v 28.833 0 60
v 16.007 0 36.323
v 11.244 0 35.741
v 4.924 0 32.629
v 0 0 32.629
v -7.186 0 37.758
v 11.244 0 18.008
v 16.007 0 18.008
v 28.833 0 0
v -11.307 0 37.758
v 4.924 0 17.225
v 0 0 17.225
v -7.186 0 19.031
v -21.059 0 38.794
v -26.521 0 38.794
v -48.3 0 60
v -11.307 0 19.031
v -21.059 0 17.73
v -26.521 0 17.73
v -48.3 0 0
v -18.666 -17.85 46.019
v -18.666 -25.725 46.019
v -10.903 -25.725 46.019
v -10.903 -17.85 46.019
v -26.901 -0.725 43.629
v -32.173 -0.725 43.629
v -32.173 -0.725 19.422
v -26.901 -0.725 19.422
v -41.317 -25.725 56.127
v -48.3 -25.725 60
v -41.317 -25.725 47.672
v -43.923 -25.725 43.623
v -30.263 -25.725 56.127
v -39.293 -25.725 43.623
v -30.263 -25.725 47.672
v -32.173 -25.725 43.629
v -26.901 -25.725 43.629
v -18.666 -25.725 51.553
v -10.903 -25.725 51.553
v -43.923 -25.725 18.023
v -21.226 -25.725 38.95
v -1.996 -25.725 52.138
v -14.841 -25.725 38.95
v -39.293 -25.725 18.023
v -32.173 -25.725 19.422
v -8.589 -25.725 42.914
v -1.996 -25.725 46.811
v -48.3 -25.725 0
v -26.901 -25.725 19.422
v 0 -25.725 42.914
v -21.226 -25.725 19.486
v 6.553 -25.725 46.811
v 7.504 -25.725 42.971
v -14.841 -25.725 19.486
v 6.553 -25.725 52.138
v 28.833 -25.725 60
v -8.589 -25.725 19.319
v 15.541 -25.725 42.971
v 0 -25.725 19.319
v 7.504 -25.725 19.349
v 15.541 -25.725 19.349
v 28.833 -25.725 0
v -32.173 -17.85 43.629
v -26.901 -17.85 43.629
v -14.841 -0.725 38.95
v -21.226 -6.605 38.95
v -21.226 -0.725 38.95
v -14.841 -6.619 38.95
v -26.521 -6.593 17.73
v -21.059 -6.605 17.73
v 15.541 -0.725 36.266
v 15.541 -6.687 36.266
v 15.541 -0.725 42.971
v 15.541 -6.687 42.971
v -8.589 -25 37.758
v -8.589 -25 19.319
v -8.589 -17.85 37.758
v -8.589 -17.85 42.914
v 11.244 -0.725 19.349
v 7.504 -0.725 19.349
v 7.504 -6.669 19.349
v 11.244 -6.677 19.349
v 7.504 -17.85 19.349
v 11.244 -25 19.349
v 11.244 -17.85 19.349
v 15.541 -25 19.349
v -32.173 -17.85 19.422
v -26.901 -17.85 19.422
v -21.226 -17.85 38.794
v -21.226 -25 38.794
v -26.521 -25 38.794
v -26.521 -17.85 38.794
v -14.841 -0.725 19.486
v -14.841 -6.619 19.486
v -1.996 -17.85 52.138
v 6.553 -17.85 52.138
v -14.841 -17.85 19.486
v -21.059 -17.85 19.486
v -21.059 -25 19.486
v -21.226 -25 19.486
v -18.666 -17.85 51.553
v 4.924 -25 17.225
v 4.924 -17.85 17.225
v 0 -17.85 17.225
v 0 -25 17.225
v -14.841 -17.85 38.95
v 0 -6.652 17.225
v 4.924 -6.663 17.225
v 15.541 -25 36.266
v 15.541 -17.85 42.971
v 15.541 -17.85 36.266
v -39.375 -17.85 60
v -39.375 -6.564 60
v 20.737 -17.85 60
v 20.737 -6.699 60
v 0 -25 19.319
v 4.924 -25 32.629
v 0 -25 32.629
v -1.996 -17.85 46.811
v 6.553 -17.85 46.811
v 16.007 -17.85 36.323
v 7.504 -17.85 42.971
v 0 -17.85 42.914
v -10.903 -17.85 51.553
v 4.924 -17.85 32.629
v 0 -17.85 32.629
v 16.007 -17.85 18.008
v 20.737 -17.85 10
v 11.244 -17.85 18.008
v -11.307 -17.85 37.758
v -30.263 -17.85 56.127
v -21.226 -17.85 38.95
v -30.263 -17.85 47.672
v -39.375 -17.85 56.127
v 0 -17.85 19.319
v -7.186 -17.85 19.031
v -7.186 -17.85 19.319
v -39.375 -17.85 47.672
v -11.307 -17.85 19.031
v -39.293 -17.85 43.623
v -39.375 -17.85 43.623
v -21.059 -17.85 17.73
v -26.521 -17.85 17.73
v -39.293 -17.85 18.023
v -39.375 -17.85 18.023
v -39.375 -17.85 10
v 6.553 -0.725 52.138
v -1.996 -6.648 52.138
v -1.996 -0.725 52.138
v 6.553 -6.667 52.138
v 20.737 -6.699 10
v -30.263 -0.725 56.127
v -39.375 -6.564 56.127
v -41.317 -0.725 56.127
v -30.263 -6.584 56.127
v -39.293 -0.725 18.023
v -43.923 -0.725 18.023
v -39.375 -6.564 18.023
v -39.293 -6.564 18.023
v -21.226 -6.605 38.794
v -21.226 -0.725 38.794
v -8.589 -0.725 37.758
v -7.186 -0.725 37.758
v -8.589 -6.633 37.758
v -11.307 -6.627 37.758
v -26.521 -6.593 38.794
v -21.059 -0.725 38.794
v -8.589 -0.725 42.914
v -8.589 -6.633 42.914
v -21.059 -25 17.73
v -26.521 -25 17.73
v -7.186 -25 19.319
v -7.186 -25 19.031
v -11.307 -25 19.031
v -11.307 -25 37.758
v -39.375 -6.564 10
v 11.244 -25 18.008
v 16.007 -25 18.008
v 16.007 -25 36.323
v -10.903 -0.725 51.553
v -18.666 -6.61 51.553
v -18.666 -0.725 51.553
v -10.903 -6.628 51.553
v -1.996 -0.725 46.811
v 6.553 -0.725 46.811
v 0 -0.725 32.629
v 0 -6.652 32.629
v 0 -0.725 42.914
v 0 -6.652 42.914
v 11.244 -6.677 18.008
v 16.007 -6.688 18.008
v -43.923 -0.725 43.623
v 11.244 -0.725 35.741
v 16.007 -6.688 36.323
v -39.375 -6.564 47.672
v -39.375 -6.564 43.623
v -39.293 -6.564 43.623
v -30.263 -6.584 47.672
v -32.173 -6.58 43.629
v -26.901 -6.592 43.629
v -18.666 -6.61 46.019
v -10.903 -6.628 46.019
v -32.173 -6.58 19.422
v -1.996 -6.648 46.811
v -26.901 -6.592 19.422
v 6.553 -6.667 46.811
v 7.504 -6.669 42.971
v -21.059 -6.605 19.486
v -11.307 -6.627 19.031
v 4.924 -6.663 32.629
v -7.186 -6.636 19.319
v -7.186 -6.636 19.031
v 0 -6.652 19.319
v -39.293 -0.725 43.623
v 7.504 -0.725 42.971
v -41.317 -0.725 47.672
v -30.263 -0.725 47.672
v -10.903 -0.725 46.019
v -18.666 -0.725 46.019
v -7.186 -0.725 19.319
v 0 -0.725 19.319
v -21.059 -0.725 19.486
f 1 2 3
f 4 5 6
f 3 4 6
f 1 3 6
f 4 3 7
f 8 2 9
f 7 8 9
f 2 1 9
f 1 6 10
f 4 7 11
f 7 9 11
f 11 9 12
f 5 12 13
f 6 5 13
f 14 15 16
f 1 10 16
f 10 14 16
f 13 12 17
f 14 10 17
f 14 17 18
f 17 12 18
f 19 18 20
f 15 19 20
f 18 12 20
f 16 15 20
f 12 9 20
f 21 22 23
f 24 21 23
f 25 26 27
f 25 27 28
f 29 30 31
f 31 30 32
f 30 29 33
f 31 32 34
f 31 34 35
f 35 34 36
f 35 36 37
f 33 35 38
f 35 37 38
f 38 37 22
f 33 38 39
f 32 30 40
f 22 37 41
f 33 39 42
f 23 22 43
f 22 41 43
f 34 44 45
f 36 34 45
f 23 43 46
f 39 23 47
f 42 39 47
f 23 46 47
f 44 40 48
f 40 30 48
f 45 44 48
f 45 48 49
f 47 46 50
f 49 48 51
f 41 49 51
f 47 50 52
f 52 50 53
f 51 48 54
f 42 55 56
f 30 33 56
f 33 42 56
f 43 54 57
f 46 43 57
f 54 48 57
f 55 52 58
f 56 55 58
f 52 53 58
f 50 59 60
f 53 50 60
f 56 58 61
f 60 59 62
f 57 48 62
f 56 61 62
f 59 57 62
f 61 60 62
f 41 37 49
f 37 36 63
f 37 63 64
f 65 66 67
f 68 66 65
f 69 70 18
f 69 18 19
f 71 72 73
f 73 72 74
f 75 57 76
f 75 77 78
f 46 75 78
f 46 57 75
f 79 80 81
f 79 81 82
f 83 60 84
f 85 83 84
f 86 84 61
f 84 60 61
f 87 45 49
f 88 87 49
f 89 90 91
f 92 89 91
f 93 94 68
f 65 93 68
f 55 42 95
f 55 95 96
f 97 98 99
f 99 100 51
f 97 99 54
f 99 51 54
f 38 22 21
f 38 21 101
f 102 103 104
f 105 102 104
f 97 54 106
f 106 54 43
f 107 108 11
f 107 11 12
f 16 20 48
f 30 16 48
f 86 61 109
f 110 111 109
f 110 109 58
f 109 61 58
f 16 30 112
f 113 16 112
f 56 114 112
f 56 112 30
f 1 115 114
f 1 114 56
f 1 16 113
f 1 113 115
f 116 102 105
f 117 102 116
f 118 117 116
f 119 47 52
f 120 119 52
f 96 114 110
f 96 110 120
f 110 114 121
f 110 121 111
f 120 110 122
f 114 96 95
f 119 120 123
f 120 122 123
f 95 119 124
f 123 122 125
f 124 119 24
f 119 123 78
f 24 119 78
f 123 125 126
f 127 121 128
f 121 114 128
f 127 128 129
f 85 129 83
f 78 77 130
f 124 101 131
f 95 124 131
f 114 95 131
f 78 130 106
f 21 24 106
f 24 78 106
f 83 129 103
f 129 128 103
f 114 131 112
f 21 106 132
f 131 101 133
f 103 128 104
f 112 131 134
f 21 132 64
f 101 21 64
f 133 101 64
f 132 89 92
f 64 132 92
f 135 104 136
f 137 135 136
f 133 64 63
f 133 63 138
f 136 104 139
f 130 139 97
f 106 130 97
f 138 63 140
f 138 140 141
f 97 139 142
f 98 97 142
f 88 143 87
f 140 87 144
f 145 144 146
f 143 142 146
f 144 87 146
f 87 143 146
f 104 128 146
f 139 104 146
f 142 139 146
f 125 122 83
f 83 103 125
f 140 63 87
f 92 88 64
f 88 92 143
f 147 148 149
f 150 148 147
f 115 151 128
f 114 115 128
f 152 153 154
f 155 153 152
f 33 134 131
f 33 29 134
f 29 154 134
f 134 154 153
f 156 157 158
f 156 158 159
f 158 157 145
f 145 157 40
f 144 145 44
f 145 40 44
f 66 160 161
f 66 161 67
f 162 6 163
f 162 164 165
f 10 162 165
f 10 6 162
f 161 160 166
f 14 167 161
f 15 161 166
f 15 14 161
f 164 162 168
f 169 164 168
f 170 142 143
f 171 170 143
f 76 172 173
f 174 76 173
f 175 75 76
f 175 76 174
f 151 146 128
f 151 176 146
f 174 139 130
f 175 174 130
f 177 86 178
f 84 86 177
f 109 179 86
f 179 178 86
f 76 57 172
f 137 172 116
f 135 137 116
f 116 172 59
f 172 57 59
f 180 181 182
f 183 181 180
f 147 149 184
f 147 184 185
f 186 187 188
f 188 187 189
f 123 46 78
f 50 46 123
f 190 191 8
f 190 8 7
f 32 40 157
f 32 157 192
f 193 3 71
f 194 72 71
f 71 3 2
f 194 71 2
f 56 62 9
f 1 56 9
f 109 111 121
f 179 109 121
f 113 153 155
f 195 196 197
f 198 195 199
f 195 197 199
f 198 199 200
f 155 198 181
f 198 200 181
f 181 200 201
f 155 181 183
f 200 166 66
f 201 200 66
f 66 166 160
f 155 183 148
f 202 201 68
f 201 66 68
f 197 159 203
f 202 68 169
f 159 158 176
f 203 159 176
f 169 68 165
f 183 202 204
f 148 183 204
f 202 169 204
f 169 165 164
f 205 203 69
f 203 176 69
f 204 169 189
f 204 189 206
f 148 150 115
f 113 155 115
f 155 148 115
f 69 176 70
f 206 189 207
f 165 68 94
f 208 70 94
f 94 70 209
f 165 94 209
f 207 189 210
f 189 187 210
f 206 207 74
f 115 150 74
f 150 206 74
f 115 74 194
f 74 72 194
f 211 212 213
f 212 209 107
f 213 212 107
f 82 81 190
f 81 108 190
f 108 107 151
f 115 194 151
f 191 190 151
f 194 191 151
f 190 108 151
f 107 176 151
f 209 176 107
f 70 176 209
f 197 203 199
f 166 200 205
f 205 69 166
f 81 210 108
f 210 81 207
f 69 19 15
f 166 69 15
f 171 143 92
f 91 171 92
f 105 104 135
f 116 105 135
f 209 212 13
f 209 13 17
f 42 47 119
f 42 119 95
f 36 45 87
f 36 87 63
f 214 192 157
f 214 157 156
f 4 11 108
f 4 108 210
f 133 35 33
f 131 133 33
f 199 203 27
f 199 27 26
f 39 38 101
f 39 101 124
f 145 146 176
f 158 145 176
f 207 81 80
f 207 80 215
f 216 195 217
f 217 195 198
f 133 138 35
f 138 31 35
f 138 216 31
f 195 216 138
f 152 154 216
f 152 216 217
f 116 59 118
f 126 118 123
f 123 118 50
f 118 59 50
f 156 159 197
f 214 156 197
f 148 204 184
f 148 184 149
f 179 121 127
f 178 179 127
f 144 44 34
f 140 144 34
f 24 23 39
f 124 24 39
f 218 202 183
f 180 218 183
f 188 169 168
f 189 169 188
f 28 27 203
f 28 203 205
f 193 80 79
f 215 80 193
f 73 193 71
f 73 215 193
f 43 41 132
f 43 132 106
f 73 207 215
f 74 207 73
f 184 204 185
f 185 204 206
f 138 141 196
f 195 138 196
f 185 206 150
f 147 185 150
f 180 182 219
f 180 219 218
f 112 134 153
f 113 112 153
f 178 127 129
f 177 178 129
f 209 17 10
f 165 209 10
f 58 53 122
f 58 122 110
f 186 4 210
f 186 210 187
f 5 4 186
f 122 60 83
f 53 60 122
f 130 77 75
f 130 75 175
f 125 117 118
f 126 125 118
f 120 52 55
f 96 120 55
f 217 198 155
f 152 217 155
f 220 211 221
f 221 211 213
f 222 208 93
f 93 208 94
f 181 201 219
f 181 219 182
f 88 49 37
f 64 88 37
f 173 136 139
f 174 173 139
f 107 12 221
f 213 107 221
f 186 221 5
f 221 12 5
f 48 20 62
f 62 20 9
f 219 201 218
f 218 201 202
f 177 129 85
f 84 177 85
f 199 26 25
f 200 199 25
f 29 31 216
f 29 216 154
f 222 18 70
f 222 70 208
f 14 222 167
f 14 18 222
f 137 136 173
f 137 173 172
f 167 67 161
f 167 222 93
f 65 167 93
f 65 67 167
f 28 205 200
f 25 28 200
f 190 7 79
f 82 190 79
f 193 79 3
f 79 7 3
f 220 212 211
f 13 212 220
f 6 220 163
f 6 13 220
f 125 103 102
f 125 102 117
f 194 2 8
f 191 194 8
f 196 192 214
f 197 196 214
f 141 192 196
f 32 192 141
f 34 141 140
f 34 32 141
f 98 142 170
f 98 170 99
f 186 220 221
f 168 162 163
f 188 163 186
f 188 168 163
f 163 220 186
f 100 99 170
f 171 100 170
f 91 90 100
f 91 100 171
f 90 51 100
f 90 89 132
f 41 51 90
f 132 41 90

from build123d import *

# Parameters (mm, degrees)
F1_DEPTH = 60
F3_DEPTH = 10
F5_DEPTH = 25
F6_W     = 4.12122
F6_H     = 18.726911
F6_W_2   = 5.461499
F6_H_2   = 21.064218
F6_W_3   = 4.923844
F6_H_3   = 15.403733
F7_DEPTH = 25
F8_W     = 5.271911
F8_H     = 24.206938
F8_W_2   = 6.385386
F8_H_2   = 19.464375
F8_W_3   = 8.589027
F8_H_3   = 23.594679
F8_W_4   = 8.036524
F8_H_4   = 23.621964
F8_W_5   = 4.6295
F8_H_5   = 25.599981
F8_W_6   = 7.762552
F8_H_6   = 5.533628
F8_W_7   = 8.549511
F8_H_7   = 5.327355
F8_W_8   = 11.053609
F8_H_8   = 8.455139
F9_DEPTH = 25


with BuildPart() as f1:
    # F0 (on Top) → F1 (new body)
    with BuildSketch(Plane.XY):
        Polygon((-48.300002, -6.563763), (-48.300002, -17.85), (-48.300002, -25.725), (28.833047, -25.725), (28.833047, 0), (-48.300002, 0), align=None)
        Polygon((20.737499, -17.85), (-39.375003, -17.85), (-39.375003, -6.563763), (20.737499, -6.698824), align=None, mode=Mode.SUBTRACT)
    extrude(amount=F1_DEPTH)

    # F2 (on face) → F3 (join)
    with BuildSketch(Plane.XY):
        Polygon((-39.375003, -17.85), (20.737499, -17.85), (20.737499, -6.698824), (-39.375003, -6.563763), align=None)
    extrude(amount=F3_DEPTH)

    # F4 (on face) → F5 (cut)
    with BuildSketch(Plane(origin=(0, 0, 0), x_dir=(-1, 0, 0), z_dir=(0, 1, 0))):
        Polygon((-11.244134, 35.740558), (-16.007215, 36.322691), (-16.007215, 18.008349), (-11.244134, 18.008349), align=None)
    extrude(amount=-F5_DEPTH, mode=Mode.SUBTRACT)

    # F6 (on face) → F7 (cut)
    with BuildSketch(Plane(origin=(0, 0, 0), x_dir=(-1, 0, 0), z_dir=(0, 1, 0))):
        with Locations((9.246856, 28.394447)):
            Rectangle(F6_W, F6_H)
        with Locations((23.790132, 28.261853)):
            Rectangle(F6_W_2, F6_H_2)
        with Locations((-2.461922, 24.927176)):
            Rectangle(F6_W_3, F6_H_3)
    extrude(amount=-F7_DEPTH, mode=Mode.SUBTRACT)

    # F8 (on face) → F9 (cut)
    with BuildSketch(Plane.XZ.offset(25.725)):
        with Locations((-29.537439, 31.525831)):
            Rectangle(F8_W, F8_H)
        with Locations((-18.033631, 29.21811)):
            Rectangle(F8_W_2, F8_H_2)
        with Locations((-4.294513, 31.116555)):
            Rectangle(F8_W_3, F8_H_3)
        with Locations((11.522623, 31.159862)):
            Rectangle(F8_W_4, F8_H_4)
        with Locations((-41.608218, 30.823439)):
            Rectangle(F8_W_5, F8_H_5)
        with Locations((-14.784377, 48.786048)):
            Rectangle(F8_W_6, F8_H_6)
        with Locations((2.278485, 49.474218)):
            Rectangle(F8_W_7, F8_H_7)
        with Locations((-35.790155, 51.899684)):
            Rectangle(F8_W_8, F8_H_8)
    extrude(amount=-F9_DEPTH, mode=Mode.SUBTRACT)


solid = f1.part
